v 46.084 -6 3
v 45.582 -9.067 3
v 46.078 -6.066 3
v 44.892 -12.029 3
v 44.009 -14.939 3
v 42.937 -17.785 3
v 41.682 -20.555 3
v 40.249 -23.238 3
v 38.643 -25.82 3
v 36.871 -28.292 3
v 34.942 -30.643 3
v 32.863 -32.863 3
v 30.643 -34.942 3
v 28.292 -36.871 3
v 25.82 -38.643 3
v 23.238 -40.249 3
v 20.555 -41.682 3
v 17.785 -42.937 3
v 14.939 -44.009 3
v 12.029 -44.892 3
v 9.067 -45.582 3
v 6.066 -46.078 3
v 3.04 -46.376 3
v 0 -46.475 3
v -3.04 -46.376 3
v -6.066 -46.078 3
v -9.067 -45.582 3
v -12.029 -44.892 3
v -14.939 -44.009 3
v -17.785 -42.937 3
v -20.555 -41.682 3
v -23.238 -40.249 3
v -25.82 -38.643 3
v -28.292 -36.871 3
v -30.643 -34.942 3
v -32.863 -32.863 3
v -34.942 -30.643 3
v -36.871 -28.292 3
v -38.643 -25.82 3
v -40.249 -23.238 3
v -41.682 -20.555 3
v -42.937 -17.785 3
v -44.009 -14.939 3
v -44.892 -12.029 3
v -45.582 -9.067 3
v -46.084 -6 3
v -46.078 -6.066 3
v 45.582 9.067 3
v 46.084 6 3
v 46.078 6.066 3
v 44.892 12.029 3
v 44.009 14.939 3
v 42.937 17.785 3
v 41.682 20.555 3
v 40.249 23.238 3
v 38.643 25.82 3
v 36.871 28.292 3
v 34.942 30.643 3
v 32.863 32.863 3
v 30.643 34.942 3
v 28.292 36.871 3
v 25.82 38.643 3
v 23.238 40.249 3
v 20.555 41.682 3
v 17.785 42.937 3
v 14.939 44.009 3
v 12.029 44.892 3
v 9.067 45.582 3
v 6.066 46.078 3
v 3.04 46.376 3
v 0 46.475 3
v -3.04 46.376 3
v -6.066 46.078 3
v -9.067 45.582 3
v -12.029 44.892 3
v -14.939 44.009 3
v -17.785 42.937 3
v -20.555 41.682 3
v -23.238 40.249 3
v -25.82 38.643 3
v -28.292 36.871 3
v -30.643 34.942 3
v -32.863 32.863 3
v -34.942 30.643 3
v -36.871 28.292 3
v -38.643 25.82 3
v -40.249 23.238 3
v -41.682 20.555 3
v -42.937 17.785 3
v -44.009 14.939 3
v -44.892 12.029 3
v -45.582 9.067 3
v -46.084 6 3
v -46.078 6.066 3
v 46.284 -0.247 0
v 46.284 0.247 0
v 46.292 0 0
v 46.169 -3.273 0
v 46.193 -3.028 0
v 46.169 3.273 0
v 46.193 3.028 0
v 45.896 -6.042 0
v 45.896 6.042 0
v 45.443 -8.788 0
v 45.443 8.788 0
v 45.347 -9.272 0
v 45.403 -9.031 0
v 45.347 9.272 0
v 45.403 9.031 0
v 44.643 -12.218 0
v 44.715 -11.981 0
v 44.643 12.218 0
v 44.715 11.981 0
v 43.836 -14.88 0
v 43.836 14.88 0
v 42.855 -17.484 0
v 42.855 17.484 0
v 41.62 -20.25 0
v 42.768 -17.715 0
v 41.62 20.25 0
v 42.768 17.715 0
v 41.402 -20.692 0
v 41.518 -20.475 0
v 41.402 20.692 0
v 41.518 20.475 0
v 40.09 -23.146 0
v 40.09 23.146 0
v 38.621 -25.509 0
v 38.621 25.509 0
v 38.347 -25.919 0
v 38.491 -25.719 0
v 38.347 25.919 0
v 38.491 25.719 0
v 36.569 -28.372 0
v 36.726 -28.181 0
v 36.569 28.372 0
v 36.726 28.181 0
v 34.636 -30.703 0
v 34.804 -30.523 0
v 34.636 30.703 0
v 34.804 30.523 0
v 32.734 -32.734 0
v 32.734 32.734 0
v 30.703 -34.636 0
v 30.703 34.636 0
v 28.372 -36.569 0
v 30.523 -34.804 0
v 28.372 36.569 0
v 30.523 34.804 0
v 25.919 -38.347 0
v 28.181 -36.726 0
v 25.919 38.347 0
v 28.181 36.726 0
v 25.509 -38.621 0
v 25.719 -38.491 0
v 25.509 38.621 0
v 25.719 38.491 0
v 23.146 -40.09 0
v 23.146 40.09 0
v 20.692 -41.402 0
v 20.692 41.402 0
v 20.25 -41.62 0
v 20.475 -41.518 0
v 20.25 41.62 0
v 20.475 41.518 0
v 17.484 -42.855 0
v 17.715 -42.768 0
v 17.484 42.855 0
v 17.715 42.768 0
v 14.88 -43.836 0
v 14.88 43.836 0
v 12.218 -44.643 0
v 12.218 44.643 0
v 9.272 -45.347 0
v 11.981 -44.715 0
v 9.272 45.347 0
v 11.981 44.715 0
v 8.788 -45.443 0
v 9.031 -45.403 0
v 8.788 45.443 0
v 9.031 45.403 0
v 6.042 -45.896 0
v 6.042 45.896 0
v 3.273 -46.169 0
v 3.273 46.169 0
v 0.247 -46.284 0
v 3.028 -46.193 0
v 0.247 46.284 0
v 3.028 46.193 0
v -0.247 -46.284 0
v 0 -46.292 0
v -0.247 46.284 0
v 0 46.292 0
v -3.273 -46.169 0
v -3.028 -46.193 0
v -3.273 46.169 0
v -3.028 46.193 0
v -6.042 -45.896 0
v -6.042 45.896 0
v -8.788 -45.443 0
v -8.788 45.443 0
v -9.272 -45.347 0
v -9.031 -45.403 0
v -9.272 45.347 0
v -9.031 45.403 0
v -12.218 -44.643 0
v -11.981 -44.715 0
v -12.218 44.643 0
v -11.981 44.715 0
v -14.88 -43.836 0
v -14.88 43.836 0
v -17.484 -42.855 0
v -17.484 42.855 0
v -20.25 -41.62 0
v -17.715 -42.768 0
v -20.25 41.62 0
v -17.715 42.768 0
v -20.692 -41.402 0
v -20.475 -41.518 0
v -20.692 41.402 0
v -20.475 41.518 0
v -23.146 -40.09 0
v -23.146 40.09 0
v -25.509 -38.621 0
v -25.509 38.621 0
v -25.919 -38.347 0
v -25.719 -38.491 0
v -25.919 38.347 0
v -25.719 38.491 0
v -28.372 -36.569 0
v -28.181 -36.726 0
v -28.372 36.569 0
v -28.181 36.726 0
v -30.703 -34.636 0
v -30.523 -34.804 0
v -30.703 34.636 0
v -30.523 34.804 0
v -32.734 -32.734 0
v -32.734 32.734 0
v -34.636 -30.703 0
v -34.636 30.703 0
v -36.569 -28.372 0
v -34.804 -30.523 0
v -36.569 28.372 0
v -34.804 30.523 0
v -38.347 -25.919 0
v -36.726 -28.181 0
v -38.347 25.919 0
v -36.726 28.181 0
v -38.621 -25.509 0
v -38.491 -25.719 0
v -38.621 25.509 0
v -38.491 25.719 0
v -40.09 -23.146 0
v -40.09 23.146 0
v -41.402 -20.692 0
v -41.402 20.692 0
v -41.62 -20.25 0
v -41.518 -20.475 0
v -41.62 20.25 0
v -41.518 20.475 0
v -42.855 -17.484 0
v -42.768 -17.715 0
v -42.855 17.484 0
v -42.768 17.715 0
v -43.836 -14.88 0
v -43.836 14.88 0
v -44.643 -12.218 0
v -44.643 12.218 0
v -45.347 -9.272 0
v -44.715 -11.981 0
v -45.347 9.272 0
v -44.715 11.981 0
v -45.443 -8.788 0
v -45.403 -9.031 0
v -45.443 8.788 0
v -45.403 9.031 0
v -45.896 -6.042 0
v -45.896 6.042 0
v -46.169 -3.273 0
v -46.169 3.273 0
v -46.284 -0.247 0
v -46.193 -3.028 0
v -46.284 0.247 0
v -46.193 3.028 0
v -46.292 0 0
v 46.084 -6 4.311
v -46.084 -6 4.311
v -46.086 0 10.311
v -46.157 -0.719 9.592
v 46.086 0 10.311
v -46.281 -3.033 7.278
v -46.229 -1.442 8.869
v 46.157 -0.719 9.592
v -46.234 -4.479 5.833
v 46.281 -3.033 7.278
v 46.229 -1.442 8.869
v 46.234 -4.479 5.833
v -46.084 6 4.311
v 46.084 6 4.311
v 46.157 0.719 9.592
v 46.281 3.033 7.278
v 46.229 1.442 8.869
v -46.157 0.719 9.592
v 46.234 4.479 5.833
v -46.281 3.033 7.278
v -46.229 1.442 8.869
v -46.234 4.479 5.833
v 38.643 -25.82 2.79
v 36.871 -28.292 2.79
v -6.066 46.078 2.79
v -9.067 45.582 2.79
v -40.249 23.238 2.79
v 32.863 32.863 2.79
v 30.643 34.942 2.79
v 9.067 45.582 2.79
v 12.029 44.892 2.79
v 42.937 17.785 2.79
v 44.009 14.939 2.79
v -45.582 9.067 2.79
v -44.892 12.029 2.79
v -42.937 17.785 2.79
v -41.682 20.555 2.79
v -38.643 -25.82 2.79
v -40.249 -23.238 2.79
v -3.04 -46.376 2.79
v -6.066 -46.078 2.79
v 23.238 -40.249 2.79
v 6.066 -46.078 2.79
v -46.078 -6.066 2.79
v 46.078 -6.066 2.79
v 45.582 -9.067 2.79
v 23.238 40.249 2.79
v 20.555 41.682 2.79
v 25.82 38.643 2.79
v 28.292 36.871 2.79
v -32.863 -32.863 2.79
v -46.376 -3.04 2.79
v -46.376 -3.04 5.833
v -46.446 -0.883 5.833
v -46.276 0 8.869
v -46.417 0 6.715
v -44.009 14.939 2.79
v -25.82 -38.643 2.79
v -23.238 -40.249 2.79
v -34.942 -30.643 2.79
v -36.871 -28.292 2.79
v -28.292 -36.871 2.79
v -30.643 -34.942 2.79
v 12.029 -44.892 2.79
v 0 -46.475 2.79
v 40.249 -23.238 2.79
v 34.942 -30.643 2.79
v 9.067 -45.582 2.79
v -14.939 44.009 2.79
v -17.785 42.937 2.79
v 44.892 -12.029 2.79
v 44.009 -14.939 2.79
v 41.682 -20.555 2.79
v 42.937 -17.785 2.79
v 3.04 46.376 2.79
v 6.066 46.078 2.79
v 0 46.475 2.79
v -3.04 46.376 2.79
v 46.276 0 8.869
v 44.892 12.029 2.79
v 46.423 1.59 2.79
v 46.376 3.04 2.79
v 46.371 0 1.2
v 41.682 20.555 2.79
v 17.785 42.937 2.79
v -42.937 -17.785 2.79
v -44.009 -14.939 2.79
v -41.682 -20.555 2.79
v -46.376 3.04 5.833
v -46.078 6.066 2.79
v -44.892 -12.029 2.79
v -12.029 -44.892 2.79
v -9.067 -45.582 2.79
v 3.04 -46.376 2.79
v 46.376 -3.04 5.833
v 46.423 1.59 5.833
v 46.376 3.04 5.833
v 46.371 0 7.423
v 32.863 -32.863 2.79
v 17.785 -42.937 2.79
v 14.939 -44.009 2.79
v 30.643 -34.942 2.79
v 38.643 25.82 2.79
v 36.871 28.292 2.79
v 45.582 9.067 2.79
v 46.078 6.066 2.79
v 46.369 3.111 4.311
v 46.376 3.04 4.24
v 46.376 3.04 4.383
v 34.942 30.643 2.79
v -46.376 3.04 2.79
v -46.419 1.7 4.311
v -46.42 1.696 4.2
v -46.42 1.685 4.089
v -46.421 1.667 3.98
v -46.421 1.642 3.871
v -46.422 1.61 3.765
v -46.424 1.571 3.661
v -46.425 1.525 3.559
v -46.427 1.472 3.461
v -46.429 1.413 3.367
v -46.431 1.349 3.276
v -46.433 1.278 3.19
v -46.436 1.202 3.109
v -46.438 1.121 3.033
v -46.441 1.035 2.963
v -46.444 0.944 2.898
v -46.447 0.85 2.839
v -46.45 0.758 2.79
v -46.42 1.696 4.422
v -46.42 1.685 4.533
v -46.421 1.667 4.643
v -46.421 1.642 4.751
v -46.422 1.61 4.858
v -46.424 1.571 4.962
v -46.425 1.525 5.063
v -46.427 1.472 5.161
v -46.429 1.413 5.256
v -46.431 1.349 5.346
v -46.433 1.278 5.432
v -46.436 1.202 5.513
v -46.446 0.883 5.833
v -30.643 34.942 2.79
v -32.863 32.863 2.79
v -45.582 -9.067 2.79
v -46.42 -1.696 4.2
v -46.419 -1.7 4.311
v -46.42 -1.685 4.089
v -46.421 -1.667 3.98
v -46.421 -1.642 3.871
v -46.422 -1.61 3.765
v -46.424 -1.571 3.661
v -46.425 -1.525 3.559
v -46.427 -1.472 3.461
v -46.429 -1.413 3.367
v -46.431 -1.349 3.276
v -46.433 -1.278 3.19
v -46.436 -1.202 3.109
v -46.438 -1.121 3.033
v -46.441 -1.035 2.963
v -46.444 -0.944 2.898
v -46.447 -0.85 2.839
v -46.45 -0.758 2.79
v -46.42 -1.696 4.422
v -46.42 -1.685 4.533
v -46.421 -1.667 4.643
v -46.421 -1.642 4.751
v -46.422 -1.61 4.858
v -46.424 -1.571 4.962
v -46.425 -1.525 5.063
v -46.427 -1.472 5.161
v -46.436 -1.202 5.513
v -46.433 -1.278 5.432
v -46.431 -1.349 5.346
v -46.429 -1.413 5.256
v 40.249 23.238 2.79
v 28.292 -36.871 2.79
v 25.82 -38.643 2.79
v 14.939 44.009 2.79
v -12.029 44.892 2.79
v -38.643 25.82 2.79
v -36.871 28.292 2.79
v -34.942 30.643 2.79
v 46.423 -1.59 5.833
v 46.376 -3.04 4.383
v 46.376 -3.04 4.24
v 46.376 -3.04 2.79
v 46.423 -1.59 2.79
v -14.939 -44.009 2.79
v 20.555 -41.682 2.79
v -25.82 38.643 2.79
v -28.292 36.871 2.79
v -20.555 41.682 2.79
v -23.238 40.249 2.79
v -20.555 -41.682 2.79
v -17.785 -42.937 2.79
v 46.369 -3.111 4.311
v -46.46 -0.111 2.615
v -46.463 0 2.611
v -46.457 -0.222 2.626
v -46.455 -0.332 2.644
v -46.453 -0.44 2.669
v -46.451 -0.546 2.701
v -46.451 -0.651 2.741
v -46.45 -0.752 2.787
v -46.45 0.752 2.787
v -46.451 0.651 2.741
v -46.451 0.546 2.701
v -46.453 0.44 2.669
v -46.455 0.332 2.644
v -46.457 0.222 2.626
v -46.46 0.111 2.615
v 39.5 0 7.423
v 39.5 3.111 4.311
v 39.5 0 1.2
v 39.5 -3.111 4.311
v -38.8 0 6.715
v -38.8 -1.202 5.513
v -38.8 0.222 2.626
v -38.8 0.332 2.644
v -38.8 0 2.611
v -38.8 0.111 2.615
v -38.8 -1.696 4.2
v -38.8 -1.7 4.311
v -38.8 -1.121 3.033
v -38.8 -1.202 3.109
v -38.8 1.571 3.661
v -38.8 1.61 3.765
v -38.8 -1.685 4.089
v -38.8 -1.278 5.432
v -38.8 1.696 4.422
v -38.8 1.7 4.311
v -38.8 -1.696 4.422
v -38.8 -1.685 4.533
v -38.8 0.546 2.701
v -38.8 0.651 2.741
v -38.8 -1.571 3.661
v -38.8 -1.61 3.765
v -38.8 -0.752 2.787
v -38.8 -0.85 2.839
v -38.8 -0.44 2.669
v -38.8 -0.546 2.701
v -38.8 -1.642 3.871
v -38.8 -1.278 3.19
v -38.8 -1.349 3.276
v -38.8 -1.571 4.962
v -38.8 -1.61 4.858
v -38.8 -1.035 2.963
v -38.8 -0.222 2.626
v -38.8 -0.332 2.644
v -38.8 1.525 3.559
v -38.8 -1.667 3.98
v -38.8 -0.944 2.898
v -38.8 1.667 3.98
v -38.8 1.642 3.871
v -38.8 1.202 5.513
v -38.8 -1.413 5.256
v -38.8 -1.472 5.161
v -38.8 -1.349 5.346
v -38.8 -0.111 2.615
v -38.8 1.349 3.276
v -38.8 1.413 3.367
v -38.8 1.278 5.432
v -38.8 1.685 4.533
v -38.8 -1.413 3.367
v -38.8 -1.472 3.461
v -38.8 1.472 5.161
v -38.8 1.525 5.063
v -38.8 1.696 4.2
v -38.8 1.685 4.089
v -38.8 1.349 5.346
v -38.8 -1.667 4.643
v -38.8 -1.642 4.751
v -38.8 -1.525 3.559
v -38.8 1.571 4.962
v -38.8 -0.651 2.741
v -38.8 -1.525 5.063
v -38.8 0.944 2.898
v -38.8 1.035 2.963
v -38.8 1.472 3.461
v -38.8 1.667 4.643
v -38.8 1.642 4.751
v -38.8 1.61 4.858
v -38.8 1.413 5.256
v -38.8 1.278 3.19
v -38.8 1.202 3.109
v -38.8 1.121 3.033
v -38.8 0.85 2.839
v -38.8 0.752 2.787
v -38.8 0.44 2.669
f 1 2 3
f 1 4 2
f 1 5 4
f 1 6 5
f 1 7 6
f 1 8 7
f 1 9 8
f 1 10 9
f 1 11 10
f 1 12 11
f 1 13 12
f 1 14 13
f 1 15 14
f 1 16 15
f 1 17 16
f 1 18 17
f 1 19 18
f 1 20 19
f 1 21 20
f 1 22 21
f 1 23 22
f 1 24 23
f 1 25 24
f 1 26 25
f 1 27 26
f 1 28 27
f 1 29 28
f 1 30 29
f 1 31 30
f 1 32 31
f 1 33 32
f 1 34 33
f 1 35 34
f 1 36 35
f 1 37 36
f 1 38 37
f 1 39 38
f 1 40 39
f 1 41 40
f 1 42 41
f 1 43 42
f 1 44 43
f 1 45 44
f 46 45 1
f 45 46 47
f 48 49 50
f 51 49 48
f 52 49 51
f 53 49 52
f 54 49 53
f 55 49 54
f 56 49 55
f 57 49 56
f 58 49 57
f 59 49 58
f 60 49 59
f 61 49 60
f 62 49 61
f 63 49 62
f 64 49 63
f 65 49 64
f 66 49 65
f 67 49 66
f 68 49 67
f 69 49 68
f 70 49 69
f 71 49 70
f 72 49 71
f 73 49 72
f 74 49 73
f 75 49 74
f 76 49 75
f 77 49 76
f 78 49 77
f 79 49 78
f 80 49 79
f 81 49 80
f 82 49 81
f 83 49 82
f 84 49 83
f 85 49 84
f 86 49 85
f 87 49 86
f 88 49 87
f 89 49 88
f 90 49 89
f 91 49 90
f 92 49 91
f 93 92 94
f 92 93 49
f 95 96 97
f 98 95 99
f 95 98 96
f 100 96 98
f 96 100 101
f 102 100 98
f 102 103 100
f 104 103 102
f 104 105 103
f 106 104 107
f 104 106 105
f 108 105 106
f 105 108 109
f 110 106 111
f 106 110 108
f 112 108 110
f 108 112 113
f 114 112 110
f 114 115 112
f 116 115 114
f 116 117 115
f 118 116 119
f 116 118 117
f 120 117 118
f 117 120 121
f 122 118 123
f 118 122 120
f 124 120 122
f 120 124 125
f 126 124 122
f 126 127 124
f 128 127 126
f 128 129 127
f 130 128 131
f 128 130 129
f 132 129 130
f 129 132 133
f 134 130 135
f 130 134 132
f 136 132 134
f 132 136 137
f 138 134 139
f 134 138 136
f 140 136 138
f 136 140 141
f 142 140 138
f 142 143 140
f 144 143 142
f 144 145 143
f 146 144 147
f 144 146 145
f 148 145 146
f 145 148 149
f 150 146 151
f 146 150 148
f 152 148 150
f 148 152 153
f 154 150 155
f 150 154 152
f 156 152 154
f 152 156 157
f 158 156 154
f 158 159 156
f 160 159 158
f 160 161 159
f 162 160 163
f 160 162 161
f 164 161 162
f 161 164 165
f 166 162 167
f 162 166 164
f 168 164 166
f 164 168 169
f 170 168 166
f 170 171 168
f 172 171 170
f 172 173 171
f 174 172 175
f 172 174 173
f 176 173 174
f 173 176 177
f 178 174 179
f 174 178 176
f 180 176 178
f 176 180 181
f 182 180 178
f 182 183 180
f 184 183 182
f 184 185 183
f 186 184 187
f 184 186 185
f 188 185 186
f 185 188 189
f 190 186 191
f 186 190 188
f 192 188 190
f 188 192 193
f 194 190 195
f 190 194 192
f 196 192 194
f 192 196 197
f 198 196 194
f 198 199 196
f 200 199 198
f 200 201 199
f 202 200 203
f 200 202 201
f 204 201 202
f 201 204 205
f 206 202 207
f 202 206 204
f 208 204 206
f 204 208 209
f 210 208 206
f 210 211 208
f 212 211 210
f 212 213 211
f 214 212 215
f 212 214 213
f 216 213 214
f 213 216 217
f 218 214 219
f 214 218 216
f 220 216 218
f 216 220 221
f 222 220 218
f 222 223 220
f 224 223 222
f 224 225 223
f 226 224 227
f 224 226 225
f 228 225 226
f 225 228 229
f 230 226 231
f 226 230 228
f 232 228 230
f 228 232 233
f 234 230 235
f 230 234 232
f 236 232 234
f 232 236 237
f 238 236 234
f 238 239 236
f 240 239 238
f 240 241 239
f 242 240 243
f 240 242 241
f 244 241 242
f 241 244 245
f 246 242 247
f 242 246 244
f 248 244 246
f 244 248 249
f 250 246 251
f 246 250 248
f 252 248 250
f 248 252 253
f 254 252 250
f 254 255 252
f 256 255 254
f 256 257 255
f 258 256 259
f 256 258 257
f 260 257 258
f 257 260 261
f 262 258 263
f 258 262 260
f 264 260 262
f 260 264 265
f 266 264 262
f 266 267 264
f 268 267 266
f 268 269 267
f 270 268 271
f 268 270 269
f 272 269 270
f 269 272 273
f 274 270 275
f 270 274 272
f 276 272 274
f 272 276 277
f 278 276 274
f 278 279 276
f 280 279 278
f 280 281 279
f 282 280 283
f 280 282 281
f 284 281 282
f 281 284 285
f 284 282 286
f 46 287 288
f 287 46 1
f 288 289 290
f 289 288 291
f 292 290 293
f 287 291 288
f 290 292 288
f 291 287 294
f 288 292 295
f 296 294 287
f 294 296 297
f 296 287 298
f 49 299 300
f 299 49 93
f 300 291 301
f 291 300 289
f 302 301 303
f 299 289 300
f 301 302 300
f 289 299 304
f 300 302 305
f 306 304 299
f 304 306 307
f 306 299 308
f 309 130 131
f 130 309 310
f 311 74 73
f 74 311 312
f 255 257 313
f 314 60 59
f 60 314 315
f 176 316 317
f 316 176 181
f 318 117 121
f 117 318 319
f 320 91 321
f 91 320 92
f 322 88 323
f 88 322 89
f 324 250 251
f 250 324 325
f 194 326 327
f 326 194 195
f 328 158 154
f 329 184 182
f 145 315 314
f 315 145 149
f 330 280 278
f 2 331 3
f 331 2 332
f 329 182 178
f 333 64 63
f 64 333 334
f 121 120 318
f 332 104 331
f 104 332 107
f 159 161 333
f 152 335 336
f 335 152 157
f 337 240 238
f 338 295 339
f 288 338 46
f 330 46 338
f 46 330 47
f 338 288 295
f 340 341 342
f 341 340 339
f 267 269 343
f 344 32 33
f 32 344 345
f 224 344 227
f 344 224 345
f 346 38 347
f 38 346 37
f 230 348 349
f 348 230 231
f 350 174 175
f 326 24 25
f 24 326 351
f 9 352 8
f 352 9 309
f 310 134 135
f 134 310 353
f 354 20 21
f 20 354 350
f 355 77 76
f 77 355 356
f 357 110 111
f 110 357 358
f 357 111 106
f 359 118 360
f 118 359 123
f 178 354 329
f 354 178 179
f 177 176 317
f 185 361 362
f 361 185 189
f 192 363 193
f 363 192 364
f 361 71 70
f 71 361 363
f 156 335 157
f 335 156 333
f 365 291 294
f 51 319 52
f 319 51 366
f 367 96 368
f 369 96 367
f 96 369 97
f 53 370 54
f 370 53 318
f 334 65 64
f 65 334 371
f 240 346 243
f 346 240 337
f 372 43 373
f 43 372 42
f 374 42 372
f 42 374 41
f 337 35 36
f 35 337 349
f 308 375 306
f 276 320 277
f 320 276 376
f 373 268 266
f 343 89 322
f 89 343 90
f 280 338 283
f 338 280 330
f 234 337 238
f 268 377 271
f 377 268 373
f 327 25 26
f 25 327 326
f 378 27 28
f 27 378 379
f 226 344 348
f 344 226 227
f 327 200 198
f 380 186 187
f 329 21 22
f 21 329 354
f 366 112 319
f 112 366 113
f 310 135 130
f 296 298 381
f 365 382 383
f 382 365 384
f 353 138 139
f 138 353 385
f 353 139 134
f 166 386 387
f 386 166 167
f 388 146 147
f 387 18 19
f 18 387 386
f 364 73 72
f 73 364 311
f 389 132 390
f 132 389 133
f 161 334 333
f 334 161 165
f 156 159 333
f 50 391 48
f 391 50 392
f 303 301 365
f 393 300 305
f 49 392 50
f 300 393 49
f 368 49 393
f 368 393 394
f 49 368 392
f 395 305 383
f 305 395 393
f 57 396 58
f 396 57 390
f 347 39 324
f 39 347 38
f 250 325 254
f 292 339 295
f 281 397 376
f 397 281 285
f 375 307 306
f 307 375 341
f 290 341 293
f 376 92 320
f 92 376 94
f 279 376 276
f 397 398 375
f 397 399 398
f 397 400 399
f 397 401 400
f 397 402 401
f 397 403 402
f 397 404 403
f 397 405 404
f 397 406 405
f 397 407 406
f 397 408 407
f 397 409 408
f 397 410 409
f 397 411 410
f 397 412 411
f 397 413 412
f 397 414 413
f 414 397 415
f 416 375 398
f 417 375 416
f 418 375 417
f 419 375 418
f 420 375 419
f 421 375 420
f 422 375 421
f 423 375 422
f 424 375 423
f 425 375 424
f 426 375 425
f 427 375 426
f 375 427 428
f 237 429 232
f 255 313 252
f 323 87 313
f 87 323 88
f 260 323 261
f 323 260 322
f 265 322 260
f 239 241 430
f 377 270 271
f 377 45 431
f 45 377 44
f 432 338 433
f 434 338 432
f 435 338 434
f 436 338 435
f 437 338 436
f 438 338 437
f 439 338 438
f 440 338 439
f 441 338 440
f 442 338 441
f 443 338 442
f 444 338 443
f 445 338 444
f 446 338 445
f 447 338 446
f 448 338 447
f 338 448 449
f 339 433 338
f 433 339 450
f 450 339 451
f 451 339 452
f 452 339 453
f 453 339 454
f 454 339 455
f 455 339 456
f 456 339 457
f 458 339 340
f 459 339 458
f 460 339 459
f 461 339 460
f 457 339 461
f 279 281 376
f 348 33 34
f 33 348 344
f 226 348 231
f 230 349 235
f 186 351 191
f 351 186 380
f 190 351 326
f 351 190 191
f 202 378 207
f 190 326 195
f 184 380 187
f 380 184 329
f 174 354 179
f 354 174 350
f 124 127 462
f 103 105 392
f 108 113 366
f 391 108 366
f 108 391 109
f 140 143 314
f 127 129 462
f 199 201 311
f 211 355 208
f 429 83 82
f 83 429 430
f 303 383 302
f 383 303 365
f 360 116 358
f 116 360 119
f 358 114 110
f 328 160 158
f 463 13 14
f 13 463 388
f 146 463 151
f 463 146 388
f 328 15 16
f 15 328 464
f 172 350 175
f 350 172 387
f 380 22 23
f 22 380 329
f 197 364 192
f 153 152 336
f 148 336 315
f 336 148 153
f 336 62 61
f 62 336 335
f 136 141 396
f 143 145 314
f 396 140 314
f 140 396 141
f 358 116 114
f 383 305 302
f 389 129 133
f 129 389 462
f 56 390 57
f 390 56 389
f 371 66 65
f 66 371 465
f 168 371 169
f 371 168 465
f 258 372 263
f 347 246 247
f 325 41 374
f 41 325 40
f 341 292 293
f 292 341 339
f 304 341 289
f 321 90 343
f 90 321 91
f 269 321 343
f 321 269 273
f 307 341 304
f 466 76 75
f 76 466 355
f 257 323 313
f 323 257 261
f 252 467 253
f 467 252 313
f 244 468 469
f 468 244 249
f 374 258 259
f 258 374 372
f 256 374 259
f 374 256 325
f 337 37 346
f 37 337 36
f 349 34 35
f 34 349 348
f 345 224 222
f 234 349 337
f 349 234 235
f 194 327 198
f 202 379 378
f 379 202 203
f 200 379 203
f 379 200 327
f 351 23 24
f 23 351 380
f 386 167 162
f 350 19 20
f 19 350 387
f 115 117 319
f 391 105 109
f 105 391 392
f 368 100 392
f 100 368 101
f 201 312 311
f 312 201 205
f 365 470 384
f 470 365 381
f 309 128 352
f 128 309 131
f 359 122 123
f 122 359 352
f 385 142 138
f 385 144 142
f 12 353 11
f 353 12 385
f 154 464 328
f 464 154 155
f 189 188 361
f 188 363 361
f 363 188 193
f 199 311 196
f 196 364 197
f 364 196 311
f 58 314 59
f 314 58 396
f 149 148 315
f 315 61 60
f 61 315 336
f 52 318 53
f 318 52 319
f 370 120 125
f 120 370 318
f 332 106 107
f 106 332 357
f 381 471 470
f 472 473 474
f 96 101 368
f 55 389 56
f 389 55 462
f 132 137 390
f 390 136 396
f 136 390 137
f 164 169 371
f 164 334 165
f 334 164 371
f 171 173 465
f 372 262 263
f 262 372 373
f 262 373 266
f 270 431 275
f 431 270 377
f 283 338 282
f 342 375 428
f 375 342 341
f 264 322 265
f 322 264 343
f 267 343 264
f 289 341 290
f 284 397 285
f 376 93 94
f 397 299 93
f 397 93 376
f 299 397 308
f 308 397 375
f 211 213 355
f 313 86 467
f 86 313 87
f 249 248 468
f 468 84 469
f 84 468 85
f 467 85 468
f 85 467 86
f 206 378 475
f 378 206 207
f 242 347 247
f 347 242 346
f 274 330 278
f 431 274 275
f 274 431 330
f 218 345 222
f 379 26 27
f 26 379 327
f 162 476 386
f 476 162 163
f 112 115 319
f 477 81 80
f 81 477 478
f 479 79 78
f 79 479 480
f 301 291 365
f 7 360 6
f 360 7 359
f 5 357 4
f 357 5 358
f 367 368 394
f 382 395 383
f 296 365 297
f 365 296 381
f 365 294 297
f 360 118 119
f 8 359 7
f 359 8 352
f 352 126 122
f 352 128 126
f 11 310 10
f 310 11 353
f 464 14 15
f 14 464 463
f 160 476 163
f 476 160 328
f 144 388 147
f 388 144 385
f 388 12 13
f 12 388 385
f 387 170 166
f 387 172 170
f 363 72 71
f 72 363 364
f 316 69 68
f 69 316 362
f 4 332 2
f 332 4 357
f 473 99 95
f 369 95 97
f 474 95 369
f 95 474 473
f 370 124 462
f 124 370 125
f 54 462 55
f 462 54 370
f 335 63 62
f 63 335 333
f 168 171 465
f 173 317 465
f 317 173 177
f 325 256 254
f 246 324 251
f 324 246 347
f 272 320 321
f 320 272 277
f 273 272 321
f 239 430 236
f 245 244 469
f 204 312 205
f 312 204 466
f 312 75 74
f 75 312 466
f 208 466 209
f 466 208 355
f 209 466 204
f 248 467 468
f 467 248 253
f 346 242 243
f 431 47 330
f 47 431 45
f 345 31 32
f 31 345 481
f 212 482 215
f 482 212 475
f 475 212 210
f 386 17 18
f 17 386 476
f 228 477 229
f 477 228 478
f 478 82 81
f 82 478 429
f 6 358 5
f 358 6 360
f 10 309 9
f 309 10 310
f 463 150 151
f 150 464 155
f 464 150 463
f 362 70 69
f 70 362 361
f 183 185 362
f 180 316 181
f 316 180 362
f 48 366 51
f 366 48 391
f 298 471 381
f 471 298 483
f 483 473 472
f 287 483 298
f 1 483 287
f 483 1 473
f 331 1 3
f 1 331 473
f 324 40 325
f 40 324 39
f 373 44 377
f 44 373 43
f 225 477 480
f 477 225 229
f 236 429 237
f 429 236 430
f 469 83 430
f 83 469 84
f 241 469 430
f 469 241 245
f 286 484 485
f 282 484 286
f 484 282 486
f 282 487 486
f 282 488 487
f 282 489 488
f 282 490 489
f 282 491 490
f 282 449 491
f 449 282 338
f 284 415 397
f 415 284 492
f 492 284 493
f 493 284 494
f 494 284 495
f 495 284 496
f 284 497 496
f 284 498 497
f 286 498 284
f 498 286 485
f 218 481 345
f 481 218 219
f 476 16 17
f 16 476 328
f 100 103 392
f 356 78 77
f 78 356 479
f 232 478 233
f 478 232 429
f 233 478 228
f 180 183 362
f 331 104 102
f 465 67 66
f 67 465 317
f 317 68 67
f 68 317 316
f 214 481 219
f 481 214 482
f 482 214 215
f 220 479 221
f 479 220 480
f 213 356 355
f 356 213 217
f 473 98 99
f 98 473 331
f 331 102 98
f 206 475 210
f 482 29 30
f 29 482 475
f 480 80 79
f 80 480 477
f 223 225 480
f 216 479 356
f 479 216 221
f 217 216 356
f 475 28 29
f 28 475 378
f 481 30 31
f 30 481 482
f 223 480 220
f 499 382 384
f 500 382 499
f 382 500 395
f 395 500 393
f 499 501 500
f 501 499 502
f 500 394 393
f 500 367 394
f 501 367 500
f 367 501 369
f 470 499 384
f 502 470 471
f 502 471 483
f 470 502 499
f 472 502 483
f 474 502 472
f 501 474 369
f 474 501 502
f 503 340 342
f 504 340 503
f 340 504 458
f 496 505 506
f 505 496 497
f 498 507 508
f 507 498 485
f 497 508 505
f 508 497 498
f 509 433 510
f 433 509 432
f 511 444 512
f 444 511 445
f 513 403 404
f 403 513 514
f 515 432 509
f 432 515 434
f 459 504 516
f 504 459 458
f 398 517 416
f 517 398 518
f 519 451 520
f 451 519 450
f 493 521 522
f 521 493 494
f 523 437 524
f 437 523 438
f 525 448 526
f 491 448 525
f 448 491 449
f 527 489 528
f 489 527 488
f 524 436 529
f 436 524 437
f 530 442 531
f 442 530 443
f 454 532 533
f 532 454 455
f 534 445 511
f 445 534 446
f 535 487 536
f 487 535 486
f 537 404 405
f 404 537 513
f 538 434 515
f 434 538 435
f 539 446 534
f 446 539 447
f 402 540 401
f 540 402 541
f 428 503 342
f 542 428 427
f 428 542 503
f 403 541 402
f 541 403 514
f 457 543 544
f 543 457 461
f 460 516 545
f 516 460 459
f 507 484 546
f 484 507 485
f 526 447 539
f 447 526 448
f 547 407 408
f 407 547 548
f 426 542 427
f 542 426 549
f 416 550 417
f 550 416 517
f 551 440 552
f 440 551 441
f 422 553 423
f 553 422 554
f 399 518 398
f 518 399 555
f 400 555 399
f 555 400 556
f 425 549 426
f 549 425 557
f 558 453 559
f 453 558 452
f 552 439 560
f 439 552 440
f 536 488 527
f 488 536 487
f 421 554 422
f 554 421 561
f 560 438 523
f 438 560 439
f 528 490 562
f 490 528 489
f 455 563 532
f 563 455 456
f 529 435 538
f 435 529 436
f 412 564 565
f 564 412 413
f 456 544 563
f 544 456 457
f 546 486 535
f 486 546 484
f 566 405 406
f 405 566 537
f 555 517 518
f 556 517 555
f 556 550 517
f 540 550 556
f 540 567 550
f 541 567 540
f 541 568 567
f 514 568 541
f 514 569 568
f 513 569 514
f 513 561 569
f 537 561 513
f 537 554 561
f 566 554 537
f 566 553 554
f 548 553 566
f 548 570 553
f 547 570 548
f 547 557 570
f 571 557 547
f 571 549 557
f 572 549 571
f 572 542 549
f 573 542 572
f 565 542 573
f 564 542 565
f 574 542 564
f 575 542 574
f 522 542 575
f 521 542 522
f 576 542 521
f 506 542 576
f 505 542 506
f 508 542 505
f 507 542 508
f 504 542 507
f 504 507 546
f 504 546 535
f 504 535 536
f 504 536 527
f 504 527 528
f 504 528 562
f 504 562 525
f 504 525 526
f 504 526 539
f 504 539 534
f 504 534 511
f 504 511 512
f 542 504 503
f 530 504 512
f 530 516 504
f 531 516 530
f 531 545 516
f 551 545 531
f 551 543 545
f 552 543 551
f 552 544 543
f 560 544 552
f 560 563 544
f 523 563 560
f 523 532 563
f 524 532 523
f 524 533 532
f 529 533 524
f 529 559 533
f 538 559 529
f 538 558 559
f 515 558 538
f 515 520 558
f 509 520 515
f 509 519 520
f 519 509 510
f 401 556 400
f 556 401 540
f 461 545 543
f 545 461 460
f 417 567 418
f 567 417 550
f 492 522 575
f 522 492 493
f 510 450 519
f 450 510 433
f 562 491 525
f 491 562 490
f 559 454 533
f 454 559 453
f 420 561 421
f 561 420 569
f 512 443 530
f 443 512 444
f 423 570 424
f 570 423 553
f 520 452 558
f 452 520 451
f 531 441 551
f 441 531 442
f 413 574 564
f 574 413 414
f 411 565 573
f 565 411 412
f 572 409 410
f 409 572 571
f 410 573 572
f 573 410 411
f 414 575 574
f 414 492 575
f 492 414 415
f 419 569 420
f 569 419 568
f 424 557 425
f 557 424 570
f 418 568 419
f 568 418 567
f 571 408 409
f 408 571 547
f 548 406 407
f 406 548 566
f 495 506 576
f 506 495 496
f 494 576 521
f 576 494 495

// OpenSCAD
include <../lib/servo-duct-manifold-lib.scad>;
$fn = 96;
valve_disc();
